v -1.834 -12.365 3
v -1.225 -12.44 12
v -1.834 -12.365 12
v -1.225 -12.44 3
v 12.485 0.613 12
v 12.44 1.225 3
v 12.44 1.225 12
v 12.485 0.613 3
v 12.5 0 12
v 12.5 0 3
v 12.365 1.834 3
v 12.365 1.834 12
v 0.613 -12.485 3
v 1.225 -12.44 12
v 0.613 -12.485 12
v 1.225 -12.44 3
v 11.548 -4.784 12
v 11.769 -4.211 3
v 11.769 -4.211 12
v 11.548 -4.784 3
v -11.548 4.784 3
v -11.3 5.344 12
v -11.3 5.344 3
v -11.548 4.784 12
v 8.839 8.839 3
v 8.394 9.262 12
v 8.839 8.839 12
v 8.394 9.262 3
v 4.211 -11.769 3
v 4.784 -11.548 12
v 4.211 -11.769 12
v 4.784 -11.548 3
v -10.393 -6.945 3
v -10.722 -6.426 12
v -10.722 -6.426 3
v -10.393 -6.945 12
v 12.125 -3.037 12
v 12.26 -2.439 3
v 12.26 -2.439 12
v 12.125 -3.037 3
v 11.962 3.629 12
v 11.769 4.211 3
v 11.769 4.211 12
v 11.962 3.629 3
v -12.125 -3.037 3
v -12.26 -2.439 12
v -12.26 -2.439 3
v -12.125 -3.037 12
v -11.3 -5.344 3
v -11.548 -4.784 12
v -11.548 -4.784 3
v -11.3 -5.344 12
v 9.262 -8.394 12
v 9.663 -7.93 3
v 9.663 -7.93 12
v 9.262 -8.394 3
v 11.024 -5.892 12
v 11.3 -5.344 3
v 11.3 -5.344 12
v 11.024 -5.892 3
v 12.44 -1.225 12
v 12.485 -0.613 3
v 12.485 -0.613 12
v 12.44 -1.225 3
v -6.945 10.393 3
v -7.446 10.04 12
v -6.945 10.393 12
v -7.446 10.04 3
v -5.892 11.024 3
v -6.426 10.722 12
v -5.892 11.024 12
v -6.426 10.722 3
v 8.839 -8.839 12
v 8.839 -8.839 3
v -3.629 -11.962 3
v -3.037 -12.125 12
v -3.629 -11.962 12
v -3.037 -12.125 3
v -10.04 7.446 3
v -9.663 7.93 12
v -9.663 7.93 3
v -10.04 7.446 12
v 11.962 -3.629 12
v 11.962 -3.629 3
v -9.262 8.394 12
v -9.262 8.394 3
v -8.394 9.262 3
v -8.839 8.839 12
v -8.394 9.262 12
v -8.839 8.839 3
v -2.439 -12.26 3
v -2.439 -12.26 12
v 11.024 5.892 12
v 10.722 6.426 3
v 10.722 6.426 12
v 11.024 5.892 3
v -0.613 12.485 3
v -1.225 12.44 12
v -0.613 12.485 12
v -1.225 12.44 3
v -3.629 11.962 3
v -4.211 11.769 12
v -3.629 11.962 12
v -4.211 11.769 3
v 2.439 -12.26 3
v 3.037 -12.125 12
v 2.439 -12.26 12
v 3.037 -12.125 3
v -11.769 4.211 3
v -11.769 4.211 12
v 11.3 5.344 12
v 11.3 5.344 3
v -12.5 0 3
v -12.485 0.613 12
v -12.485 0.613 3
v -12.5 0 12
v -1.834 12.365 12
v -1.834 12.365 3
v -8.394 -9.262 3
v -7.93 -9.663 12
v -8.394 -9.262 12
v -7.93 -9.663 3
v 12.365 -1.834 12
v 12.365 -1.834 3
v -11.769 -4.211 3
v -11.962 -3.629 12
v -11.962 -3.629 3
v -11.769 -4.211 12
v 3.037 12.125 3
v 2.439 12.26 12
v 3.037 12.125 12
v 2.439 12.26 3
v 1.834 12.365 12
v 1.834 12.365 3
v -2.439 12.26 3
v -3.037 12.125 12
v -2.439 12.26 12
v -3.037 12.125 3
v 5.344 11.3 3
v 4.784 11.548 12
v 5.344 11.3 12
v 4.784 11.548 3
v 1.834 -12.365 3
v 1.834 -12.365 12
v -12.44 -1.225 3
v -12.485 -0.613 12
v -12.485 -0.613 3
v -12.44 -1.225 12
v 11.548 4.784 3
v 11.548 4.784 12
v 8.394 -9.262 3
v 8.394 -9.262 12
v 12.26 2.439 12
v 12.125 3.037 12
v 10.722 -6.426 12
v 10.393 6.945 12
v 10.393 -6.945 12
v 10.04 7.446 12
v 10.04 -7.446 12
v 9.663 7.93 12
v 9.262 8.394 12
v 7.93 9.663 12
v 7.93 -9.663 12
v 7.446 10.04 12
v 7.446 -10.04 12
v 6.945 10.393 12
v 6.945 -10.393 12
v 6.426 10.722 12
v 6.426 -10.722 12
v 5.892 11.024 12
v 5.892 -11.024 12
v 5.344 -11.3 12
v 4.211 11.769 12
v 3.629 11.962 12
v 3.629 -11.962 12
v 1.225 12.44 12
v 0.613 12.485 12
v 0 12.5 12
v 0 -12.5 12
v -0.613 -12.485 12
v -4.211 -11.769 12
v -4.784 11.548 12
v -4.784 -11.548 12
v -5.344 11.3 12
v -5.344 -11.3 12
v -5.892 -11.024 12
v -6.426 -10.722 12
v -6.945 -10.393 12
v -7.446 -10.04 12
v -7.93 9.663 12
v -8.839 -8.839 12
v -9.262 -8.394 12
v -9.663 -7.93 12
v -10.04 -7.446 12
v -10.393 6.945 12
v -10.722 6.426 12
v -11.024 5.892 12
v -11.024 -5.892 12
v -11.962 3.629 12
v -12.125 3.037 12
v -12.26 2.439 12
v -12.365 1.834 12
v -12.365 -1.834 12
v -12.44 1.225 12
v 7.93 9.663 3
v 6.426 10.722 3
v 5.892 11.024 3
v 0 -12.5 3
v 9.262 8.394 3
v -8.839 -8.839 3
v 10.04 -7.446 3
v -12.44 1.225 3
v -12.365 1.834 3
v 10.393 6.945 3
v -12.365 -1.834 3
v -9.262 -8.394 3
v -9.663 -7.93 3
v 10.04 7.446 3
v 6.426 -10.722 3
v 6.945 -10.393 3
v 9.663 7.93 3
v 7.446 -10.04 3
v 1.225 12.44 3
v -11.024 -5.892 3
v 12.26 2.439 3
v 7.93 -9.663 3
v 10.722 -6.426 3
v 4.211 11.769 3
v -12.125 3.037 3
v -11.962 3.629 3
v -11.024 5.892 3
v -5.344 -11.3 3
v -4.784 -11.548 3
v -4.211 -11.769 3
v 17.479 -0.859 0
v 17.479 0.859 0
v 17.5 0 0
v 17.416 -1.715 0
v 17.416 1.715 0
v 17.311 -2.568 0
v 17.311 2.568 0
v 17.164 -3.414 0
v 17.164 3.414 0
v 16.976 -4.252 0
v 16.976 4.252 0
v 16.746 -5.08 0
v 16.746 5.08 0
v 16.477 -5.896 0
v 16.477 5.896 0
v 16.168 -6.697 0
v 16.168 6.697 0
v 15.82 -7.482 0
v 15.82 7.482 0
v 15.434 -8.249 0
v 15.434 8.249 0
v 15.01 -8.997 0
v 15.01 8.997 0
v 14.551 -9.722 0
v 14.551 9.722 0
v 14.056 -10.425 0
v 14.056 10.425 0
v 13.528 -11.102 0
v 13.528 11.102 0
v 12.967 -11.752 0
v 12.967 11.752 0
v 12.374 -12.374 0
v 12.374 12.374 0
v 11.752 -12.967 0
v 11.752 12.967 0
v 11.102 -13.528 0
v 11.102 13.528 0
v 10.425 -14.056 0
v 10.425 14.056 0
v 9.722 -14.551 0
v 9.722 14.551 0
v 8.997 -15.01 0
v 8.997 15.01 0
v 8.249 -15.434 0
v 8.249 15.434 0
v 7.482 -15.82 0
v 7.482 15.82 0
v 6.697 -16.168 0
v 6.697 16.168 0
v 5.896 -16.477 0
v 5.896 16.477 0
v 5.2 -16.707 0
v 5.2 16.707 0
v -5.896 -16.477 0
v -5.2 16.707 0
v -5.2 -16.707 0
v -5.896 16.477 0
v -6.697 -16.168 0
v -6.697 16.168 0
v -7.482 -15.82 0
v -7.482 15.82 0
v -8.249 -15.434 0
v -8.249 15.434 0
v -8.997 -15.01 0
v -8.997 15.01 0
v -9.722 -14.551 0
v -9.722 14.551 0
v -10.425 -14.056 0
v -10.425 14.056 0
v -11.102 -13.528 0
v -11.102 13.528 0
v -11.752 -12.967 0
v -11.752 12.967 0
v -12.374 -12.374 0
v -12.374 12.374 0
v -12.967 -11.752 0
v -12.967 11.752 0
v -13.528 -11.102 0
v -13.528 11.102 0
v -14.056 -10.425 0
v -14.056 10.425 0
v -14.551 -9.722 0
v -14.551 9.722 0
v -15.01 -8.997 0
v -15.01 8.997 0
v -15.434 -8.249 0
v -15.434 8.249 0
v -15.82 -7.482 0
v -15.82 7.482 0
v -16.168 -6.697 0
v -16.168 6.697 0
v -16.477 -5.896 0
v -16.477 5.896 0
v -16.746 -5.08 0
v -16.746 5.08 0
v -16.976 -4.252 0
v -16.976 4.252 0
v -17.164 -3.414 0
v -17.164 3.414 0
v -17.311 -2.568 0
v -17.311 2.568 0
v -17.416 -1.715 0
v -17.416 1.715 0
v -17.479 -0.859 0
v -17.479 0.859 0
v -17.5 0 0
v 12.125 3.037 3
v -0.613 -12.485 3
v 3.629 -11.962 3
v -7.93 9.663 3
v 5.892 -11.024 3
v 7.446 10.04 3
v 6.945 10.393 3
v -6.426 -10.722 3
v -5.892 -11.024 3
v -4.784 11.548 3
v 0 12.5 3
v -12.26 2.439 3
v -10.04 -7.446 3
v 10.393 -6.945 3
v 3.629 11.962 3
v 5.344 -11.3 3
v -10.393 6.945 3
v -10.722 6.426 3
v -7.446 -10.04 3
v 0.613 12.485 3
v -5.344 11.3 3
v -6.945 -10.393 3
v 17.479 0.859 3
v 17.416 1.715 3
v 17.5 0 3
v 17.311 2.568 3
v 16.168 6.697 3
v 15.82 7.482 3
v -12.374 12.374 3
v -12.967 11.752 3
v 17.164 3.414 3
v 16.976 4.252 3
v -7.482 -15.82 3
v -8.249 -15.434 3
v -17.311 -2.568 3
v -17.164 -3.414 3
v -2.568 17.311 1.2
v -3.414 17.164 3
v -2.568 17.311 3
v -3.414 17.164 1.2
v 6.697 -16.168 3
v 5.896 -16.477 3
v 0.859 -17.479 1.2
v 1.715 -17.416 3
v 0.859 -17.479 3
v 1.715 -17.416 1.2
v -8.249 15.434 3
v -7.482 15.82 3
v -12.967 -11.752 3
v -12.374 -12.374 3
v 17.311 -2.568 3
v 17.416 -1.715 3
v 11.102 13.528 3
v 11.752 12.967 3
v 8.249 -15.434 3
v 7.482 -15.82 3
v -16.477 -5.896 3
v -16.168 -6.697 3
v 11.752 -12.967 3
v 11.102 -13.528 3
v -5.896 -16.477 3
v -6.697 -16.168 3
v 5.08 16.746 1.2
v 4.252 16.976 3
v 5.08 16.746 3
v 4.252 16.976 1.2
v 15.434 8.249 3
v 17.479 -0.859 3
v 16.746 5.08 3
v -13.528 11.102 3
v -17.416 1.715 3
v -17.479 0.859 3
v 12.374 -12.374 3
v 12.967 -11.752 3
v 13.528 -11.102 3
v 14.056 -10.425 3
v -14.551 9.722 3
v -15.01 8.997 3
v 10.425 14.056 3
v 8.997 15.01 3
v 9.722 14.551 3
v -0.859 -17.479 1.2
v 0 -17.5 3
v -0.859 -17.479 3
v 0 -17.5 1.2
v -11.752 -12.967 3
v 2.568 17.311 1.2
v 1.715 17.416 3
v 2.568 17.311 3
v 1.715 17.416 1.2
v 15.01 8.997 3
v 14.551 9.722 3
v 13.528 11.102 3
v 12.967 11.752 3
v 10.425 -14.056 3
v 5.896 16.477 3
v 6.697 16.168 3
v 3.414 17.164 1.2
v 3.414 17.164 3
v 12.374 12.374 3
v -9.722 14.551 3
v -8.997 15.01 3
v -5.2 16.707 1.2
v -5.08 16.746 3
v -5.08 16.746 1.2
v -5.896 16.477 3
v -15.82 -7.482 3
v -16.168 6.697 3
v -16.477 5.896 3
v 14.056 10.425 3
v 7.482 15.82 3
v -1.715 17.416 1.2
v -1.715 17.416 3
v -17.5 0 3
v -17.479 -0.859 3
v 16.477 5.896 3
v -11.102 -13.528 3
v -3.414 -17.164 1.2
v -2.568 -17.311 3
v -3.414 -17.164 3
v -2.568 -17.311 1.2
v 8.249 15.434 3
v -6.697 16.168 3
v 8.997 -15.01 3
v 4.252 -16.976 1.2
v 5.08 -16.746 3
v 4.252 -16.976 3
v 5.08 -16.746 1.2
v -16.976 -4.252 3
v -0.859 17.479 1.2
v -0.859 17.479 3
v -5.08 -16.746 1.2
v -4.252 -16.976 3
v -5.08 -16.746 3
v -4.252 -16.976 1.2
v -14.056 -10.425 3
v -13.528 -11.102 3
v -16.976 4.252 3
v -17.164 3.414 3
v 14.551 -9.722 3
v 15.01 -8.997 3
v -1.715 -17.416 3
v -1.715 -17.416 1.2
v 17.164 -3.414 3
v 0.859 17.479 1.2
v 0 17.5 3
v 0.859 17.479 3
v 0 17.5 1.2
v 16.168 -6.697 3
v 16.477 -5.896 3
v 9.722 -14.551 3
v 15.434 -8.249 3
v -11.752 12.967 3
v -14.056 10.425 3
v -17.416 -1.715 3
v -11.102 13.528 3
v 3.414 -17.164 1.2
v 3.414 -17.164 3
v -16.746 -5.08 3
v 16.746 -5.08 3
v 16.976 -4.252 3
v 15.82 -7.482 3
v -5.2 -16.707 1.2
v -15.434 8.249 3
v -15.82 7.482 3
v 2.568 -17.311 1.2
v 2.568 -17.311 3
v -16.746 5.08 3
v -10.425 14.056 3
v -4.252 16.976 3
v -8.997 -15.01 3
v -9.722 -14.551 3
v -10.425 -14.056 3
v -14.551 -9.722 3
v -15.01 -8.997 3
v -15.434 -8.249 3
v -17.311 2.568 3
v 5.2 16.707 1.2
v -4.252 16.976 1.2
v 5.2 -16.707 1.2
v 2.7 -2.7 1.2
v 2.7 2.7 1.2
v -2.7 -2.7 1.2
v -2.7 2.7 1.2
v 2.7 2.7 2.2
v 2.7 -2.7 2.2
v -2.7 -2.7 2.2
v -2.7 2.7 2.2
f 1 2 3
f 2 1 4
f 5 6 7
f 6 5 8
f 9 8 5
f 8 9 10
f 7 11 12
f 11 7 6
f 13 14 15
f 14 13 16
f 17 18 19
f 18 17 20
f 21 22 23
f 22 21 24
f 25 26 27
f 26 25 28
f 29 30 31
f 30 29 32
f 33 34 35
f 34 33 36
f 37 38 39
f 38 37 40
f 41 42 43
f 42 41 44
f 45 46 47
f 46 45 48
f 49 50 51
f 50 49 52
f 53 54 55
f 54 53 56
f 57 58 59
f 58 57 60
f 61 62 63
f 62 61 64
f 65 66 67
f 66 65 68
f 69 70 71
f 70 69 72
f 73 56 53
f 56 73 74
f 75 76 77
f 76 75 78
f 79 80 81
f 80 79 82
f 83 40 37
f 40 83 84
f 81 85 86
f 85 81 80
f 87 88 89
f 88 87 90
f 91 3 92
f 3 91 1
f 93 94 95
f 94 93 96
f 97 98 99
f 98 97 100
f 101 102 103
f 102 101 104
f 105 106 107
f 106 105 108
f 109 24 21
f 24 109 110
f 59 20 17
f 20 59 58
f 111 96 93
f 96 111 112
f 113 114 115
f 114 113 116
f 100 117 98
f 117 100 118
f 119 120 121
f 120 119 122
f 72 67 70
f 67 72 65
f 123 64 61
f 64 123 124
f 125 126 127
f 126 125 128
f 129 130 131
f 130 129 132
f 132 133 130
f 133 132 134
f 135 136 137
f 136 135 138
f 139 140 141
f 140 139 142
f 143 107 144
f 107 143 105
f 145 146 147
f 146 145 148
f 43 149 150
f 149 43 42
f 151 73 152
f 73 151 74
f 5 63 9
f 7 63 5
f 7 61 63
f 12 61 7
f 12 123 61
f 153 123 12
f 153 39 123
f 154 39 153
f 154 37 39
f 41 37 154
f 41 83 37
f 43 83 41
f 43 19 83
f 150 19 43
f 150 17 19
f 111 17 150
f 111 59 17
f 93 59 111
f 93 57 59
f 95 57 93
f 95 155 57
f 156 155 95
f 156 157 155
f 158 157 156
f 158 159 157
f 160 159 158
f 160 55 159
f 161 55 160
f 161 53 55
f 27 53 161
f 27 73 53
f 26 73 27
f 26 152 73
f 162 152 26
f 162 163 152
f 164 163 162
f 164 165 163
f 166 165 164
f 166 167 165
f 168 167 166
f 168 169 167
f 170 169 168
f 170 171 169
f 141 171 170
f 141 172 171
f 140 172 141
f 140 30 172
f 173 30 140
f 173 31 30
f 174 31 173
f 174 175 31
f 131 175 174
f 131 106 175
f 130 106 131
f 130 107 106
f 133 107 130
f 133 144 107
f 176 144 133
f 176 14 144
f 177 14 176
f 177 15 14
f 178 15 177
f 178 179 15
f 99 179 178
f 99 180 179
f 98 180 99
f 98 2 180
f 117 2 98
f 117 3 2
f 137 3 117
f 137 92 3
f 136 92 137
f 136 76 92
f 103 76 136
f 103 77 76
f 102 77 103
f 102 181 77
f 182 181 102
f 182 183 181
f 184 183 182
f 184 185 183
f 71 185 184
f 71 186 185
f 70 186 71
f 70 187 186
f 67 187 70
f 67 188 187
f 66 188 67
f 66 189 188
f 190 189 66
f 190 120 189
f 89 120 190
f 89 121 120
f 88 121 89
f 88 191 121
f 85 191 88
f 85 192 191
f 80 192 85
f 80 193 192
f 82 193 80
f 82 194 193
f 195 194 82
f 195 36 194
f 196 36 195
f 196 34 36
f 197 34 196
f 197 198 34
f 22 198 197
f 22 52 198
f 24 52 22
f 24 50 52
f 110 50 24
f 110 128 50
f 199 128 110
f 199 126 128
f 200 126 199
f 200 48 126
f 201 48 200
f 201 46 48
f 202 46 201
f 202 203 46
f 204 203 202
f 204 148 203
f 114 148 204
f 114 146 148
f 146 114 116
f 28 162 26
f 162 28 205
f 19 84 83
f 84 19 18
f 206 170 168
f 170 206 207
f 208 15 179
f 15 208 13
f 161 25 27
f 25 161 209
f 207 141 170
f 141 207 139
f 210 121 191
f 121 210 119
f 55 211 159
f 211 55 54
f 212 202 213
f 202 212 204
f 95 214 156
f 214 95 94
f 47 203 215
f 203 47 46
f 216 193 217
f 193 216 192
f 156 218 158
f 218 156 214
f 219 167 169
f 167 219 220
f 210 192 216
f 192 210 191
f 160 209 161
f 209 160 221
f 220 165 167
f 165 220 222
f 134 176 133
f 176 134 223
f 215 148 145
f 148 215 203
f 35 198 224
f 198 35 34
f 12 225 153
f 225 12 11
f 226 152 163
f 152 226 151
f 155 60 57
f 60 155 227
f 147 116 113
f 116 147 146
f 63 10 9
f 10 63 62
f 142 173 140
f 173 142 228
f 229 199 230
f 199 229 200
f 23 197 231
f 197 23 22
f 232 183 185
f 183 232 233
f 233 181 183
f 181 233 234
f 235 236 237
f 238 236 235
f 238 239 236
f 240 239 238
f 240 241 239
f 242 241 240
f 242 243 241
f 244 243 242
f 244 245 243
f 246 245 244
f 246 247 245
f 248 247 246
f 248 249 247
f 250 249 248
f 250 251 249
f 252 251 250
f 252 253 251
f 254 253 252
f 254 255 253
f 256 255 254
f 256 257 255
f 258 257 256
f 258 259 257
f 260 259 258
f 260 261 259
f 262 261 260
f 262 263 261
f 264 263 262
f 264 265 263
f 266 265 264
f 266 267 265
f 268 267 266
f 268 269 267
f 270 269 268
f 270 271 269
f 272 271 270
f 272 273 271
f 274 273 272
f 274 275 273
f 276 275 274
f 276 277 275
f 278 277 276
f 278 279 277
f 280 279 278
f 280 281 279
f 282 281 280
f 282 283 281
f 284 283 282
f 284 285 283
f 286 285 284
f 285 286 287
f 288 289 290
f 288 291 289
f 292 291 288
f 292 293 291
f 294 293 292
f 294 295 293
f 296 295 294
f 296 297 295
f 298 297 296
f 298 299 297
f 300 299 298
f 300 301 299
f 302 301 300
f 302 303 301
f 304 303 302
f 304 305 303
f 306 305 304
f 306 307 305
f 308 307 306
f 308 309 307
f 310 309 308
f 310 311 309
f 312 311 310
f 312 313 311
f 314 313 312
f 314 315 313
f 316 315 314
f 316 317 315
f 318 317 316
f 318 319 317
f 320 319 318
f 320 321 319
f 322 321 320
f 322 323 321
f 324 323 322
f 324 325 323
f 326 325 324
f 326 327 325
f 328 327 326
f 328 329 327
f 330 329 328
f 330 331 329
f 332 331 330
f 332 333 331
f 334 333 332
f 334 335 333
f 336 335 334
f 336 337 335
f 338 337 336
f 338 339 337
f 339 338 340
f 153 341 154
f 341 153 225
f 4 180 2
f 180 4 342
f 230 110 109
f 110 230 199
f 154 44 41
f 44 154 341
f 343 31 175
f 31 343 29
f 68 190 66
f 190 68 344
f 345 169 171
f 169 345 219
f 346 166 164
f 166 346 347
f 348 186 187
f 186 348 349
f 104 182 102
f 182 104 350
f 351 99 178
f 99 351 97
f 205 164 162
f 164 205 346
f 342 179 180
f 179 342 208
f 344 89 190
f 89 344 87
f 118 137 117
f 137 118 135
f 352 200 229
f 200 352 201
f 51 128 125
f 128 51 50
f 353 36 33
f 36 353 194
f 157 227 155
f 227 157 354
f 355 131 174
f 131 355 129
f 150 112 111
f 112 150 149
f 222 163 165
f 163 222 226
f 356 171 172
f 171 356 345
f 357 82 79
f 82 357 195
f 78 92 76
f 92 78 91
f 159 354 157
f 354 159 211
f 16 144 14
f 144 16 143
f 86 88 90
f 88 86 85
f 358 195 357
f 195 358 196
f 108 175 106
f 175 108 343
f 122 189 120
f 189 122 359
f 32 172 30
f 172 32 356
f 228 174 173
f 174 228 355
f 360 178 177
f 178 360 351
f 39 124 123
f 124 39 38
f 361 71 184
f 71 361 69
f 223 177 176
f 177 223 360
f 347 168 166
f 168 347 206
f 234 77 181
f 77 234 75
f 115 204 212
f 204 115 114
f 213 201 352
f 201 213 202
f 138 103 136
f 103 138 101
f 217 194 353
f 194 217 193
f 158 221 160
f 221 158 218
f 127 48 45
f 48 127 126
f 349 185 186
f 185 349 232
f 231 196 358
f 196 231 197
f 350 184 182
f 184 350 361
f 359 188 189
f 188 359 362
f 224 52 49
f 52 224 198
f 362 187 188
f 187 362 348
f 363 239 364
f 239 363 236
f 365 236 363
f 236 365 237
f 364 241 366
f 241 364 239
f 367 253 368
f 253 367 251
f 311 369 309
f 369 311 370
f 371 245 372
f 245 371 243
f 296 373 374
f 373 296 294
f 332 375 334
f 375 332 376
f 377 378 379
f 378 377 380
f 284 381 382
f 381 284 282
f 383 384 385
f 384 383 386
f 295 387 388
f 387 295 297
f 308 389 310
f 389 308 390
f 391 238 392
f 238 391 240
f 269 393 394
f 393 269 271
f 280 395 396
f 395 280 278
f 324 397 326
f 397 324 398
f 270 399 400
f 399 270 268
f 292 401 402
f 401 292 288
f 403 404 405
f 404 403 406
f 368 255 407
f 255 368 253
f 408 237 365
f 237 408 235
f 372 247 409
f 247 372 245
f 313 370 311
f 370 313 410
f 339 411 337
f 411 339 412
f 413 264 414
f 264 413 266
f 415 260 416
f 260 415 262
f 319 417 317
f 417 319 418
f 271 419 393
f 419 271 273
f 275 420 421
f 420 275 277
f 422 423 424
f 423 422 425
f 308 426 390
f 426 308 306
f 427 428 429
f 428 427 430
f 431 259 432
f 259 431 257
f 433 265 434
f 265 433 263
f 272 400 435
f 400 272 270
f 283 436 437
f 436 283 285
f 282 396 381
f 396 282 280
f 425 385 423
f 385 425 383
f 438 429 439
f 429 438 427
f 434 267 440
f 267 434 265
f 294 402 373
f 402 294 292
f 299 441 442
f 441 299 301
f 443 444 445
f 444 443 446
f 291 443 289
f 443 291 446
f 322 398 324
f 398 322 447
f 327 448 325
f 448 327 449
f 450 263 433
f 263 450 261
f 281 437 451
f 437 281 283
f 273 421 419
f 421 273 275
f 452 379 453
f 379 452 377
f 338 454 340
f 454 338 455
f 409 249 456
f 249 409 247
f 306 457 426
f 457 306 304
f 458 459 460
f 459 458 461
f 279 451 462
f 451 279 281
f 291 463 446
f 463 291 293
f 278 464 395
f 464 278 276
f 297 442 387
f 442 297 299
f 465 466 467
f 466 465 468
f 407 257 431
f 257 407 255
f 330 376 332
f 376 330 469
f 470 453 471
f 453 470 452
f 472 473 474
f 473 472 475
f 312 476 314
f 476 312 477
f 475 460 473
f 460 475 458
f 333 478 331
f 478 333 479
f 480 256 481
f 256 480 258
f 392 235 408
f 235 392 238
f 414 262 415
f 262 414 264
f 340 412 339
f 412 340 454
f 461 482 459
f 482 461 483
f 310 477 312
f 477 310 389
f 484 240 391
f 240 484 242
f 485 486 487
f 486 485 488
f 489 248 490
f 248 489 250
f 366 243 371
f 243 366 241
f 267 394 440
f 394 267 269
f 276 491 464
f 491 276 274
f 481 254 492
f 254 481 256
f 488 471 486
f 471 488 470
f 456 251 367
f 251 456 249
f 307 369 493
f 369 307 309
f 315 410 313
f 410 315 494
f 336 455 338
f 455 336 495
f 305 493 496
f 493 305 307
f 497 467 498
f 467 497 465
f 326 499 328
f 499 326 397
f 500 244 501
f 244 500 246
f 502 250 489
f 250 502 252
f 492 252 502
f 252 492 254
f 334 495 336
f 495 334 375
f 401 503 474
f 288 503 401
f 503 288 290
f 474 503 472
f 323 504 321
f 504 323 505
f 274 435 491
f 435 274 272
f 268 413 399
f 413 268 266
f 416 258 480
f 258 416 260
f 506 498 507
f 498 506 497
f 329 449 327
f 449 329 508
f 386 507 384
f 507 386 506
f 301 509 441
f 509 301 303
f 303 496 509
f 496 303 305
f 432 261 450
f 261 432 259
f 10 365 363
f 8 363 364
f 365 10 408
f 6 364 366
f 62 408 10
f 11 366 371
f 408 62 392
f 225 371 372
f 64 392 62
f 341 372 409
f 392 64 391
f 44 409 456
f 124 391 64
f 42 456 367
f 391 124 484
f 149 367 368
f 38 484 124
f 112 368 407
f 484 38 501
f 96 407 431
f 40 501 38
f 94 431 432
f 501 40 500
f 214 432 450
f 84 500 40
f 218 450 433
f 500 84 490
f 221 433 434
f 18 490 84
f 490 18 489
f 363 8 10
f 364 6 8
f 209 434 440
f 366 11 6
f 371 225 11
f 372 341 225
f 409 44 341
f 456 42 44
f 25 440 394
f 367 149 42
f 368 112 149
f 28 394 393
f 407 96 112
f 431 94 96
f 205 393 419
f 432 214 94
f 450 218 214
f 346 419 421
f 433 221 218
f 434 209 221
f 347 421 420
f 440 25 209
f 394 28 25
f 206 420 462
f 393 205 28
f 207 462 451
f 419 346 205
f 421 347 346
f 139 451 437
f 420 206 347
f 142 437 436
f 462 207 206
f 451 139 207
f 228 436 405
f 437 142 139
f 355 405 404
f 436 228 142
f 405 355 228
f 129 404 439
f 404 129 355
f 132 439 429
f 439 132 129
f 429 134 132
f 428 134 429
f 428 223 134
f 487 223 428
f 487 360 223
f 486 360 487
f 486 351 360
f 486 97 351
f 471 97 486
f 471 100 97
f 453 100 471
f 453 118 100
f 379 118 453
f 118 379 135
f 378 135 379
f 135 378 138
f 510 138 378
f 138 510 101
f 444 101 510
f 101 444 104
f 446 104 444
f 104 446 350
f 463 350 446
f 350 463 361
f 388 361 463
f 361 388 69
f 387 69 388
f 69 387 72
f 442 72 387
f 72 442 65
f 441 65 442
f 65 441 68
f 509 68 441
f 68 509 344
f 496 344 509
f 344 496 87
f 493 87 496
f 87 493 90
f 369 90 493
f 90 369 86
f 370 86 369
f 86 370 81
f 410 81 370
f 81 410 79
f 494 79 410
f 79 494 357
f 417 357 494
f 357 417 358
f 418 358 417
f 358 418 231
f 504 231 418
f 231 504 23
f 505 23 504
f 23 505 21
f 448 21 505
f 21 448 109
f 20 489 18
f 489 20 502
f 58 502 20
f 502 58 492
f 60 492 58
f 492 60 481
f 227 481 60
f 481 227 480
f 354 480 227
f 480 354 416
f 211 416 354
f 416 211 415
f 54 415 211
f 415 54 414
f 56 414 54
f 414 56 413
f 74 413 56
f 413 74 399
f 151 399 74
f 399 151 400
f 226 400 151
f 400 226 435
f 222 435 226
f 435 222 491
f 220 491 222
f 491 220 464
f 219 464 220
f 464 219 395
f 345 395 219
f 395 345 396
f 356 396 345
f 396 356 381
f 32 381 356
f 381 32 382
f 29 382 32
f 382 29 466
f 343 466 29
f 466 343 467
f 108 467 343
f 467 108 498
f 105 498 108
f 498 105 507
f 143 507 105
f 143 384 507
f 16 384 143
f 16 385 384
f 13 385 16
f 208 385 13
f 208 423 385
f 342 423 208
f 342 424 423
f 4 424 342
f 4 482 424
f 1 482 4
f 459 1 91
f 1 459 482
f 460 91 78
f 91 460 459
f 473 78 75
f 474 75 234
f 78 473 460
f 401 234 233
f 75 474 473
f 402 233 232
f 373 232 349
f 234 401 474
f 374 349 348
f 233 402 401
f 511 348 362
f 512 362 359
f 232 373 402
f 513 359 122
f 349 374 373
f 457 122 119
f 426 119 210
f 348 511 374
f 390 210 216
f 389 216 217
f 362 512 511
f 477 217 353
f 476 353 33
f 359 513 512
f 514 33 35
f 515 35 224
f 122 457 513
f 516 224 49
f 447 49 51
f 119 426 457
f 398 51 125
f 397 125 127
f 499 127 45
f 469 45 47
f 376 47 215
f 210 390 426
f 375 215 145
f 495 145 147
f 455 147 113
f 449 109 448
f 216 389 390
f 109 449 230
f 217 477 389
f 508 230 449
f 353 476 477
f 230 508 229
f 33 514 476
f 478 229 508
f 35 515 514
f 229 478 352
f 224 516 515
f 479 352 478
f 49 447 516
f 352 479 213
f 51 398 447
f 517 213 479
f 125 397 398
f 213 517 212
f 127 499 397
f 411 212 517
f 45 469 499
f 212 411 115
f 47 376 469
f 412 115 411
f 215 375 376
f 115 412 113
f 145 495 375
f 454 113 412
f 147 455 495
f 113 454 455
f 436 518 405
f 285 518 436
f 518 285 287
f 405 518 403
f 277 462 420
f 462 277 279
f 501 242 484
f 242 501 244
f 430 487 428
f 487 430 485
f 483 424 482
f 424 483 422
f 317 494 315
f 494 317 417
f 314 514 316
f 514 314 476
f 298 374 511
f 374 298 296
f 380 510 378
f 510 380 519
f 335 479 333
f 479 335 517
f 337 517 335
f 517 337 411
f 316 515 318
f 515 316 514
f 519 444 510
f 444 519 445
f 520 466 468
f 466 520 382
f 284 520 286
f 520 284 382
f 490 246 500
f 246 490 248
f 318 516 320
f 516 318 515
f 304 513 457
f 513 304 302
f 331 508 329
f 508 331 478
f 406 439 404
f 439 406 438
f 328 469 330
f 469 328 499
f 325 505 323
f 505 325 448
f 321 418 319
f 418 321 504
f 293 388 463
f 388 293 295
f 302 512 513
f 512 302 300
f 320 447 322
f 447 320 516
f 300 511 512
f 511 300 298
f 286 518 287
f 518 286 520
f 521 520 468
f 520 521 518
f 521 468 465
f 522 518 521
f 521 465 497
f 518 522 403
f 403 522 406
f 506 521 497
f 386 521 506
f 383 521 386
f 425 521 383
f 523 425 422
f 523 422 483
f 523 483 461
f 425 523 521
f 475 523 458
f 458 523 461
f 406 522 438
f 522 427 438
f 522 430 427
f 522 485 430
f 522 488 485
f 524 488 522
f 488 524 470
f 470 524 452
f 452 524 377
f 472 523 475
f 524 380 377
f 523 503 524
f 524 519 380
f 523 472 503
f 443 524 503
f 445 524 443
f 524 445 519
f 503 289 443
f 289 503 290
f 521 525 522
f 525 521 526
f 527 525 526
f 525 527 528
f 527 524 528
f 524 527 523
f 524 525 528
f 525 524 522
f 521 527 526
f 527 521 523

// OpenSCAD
$fn=128;
r = 12.5;
h = 12;
brim = 5;
walls = 3;
tolerence = .4;
bottom = 3;
// width, height of contact element (paper clip)
contactX = 10;
contactZ = 1;

// mounting posts
postR = 3;
postHole = 1;

outerR = r + brim + walls;

module contact() {
    // profile of contact device
    cube([ contactX + tolerence, r * 4, contactZ + tolerence ], center=true);
}
module button() {
    difference() {
        union() {
            cylinder(r=r, h=h);
            cylinder(r= r + brim, h=bottom);
        }
        translate([0,0,contactZ / 2]) contact();
        //hole for LED
        translate([0,0,contactZ]) cube([ 5 + tolerence, 5 + tolerence, 2 + tolerence ], center=true);
    }
}

module post() {
    difference() {
        cylinder(r=postR, h=h);
        cylinder(r=postHole, h=h);
    }
}

module housing() {
    union() {
        difference() {
            cylinder(r= r + brim+ walls, h=h);
            cylinder(r= r + brim + tolerence, h=h);
            // holes for contacts
            translate([0, .8*r, bottom + ( h - bottom ) / 4]) rotate([0,0,90]) contact();
            translate([0, -.8*r, bottom + ( h - bottom ) / 4]) rotate([0,0,90]) contact();
        }
        translate(0,0,bottom-h) cylinder(r=r + brim + walls, h=bottom);
        // add posts for mounting
        translate([outerR+postR/4,0,0]) post();
        translate([0,outerR+postR/4,0]) post();
        translate([-outerR-postR/4,0,0]) post();
        translate([0,-outerR-postR/4,0]) post();
        
    }
}


button();
//translate([0,0,-h]) housing();
